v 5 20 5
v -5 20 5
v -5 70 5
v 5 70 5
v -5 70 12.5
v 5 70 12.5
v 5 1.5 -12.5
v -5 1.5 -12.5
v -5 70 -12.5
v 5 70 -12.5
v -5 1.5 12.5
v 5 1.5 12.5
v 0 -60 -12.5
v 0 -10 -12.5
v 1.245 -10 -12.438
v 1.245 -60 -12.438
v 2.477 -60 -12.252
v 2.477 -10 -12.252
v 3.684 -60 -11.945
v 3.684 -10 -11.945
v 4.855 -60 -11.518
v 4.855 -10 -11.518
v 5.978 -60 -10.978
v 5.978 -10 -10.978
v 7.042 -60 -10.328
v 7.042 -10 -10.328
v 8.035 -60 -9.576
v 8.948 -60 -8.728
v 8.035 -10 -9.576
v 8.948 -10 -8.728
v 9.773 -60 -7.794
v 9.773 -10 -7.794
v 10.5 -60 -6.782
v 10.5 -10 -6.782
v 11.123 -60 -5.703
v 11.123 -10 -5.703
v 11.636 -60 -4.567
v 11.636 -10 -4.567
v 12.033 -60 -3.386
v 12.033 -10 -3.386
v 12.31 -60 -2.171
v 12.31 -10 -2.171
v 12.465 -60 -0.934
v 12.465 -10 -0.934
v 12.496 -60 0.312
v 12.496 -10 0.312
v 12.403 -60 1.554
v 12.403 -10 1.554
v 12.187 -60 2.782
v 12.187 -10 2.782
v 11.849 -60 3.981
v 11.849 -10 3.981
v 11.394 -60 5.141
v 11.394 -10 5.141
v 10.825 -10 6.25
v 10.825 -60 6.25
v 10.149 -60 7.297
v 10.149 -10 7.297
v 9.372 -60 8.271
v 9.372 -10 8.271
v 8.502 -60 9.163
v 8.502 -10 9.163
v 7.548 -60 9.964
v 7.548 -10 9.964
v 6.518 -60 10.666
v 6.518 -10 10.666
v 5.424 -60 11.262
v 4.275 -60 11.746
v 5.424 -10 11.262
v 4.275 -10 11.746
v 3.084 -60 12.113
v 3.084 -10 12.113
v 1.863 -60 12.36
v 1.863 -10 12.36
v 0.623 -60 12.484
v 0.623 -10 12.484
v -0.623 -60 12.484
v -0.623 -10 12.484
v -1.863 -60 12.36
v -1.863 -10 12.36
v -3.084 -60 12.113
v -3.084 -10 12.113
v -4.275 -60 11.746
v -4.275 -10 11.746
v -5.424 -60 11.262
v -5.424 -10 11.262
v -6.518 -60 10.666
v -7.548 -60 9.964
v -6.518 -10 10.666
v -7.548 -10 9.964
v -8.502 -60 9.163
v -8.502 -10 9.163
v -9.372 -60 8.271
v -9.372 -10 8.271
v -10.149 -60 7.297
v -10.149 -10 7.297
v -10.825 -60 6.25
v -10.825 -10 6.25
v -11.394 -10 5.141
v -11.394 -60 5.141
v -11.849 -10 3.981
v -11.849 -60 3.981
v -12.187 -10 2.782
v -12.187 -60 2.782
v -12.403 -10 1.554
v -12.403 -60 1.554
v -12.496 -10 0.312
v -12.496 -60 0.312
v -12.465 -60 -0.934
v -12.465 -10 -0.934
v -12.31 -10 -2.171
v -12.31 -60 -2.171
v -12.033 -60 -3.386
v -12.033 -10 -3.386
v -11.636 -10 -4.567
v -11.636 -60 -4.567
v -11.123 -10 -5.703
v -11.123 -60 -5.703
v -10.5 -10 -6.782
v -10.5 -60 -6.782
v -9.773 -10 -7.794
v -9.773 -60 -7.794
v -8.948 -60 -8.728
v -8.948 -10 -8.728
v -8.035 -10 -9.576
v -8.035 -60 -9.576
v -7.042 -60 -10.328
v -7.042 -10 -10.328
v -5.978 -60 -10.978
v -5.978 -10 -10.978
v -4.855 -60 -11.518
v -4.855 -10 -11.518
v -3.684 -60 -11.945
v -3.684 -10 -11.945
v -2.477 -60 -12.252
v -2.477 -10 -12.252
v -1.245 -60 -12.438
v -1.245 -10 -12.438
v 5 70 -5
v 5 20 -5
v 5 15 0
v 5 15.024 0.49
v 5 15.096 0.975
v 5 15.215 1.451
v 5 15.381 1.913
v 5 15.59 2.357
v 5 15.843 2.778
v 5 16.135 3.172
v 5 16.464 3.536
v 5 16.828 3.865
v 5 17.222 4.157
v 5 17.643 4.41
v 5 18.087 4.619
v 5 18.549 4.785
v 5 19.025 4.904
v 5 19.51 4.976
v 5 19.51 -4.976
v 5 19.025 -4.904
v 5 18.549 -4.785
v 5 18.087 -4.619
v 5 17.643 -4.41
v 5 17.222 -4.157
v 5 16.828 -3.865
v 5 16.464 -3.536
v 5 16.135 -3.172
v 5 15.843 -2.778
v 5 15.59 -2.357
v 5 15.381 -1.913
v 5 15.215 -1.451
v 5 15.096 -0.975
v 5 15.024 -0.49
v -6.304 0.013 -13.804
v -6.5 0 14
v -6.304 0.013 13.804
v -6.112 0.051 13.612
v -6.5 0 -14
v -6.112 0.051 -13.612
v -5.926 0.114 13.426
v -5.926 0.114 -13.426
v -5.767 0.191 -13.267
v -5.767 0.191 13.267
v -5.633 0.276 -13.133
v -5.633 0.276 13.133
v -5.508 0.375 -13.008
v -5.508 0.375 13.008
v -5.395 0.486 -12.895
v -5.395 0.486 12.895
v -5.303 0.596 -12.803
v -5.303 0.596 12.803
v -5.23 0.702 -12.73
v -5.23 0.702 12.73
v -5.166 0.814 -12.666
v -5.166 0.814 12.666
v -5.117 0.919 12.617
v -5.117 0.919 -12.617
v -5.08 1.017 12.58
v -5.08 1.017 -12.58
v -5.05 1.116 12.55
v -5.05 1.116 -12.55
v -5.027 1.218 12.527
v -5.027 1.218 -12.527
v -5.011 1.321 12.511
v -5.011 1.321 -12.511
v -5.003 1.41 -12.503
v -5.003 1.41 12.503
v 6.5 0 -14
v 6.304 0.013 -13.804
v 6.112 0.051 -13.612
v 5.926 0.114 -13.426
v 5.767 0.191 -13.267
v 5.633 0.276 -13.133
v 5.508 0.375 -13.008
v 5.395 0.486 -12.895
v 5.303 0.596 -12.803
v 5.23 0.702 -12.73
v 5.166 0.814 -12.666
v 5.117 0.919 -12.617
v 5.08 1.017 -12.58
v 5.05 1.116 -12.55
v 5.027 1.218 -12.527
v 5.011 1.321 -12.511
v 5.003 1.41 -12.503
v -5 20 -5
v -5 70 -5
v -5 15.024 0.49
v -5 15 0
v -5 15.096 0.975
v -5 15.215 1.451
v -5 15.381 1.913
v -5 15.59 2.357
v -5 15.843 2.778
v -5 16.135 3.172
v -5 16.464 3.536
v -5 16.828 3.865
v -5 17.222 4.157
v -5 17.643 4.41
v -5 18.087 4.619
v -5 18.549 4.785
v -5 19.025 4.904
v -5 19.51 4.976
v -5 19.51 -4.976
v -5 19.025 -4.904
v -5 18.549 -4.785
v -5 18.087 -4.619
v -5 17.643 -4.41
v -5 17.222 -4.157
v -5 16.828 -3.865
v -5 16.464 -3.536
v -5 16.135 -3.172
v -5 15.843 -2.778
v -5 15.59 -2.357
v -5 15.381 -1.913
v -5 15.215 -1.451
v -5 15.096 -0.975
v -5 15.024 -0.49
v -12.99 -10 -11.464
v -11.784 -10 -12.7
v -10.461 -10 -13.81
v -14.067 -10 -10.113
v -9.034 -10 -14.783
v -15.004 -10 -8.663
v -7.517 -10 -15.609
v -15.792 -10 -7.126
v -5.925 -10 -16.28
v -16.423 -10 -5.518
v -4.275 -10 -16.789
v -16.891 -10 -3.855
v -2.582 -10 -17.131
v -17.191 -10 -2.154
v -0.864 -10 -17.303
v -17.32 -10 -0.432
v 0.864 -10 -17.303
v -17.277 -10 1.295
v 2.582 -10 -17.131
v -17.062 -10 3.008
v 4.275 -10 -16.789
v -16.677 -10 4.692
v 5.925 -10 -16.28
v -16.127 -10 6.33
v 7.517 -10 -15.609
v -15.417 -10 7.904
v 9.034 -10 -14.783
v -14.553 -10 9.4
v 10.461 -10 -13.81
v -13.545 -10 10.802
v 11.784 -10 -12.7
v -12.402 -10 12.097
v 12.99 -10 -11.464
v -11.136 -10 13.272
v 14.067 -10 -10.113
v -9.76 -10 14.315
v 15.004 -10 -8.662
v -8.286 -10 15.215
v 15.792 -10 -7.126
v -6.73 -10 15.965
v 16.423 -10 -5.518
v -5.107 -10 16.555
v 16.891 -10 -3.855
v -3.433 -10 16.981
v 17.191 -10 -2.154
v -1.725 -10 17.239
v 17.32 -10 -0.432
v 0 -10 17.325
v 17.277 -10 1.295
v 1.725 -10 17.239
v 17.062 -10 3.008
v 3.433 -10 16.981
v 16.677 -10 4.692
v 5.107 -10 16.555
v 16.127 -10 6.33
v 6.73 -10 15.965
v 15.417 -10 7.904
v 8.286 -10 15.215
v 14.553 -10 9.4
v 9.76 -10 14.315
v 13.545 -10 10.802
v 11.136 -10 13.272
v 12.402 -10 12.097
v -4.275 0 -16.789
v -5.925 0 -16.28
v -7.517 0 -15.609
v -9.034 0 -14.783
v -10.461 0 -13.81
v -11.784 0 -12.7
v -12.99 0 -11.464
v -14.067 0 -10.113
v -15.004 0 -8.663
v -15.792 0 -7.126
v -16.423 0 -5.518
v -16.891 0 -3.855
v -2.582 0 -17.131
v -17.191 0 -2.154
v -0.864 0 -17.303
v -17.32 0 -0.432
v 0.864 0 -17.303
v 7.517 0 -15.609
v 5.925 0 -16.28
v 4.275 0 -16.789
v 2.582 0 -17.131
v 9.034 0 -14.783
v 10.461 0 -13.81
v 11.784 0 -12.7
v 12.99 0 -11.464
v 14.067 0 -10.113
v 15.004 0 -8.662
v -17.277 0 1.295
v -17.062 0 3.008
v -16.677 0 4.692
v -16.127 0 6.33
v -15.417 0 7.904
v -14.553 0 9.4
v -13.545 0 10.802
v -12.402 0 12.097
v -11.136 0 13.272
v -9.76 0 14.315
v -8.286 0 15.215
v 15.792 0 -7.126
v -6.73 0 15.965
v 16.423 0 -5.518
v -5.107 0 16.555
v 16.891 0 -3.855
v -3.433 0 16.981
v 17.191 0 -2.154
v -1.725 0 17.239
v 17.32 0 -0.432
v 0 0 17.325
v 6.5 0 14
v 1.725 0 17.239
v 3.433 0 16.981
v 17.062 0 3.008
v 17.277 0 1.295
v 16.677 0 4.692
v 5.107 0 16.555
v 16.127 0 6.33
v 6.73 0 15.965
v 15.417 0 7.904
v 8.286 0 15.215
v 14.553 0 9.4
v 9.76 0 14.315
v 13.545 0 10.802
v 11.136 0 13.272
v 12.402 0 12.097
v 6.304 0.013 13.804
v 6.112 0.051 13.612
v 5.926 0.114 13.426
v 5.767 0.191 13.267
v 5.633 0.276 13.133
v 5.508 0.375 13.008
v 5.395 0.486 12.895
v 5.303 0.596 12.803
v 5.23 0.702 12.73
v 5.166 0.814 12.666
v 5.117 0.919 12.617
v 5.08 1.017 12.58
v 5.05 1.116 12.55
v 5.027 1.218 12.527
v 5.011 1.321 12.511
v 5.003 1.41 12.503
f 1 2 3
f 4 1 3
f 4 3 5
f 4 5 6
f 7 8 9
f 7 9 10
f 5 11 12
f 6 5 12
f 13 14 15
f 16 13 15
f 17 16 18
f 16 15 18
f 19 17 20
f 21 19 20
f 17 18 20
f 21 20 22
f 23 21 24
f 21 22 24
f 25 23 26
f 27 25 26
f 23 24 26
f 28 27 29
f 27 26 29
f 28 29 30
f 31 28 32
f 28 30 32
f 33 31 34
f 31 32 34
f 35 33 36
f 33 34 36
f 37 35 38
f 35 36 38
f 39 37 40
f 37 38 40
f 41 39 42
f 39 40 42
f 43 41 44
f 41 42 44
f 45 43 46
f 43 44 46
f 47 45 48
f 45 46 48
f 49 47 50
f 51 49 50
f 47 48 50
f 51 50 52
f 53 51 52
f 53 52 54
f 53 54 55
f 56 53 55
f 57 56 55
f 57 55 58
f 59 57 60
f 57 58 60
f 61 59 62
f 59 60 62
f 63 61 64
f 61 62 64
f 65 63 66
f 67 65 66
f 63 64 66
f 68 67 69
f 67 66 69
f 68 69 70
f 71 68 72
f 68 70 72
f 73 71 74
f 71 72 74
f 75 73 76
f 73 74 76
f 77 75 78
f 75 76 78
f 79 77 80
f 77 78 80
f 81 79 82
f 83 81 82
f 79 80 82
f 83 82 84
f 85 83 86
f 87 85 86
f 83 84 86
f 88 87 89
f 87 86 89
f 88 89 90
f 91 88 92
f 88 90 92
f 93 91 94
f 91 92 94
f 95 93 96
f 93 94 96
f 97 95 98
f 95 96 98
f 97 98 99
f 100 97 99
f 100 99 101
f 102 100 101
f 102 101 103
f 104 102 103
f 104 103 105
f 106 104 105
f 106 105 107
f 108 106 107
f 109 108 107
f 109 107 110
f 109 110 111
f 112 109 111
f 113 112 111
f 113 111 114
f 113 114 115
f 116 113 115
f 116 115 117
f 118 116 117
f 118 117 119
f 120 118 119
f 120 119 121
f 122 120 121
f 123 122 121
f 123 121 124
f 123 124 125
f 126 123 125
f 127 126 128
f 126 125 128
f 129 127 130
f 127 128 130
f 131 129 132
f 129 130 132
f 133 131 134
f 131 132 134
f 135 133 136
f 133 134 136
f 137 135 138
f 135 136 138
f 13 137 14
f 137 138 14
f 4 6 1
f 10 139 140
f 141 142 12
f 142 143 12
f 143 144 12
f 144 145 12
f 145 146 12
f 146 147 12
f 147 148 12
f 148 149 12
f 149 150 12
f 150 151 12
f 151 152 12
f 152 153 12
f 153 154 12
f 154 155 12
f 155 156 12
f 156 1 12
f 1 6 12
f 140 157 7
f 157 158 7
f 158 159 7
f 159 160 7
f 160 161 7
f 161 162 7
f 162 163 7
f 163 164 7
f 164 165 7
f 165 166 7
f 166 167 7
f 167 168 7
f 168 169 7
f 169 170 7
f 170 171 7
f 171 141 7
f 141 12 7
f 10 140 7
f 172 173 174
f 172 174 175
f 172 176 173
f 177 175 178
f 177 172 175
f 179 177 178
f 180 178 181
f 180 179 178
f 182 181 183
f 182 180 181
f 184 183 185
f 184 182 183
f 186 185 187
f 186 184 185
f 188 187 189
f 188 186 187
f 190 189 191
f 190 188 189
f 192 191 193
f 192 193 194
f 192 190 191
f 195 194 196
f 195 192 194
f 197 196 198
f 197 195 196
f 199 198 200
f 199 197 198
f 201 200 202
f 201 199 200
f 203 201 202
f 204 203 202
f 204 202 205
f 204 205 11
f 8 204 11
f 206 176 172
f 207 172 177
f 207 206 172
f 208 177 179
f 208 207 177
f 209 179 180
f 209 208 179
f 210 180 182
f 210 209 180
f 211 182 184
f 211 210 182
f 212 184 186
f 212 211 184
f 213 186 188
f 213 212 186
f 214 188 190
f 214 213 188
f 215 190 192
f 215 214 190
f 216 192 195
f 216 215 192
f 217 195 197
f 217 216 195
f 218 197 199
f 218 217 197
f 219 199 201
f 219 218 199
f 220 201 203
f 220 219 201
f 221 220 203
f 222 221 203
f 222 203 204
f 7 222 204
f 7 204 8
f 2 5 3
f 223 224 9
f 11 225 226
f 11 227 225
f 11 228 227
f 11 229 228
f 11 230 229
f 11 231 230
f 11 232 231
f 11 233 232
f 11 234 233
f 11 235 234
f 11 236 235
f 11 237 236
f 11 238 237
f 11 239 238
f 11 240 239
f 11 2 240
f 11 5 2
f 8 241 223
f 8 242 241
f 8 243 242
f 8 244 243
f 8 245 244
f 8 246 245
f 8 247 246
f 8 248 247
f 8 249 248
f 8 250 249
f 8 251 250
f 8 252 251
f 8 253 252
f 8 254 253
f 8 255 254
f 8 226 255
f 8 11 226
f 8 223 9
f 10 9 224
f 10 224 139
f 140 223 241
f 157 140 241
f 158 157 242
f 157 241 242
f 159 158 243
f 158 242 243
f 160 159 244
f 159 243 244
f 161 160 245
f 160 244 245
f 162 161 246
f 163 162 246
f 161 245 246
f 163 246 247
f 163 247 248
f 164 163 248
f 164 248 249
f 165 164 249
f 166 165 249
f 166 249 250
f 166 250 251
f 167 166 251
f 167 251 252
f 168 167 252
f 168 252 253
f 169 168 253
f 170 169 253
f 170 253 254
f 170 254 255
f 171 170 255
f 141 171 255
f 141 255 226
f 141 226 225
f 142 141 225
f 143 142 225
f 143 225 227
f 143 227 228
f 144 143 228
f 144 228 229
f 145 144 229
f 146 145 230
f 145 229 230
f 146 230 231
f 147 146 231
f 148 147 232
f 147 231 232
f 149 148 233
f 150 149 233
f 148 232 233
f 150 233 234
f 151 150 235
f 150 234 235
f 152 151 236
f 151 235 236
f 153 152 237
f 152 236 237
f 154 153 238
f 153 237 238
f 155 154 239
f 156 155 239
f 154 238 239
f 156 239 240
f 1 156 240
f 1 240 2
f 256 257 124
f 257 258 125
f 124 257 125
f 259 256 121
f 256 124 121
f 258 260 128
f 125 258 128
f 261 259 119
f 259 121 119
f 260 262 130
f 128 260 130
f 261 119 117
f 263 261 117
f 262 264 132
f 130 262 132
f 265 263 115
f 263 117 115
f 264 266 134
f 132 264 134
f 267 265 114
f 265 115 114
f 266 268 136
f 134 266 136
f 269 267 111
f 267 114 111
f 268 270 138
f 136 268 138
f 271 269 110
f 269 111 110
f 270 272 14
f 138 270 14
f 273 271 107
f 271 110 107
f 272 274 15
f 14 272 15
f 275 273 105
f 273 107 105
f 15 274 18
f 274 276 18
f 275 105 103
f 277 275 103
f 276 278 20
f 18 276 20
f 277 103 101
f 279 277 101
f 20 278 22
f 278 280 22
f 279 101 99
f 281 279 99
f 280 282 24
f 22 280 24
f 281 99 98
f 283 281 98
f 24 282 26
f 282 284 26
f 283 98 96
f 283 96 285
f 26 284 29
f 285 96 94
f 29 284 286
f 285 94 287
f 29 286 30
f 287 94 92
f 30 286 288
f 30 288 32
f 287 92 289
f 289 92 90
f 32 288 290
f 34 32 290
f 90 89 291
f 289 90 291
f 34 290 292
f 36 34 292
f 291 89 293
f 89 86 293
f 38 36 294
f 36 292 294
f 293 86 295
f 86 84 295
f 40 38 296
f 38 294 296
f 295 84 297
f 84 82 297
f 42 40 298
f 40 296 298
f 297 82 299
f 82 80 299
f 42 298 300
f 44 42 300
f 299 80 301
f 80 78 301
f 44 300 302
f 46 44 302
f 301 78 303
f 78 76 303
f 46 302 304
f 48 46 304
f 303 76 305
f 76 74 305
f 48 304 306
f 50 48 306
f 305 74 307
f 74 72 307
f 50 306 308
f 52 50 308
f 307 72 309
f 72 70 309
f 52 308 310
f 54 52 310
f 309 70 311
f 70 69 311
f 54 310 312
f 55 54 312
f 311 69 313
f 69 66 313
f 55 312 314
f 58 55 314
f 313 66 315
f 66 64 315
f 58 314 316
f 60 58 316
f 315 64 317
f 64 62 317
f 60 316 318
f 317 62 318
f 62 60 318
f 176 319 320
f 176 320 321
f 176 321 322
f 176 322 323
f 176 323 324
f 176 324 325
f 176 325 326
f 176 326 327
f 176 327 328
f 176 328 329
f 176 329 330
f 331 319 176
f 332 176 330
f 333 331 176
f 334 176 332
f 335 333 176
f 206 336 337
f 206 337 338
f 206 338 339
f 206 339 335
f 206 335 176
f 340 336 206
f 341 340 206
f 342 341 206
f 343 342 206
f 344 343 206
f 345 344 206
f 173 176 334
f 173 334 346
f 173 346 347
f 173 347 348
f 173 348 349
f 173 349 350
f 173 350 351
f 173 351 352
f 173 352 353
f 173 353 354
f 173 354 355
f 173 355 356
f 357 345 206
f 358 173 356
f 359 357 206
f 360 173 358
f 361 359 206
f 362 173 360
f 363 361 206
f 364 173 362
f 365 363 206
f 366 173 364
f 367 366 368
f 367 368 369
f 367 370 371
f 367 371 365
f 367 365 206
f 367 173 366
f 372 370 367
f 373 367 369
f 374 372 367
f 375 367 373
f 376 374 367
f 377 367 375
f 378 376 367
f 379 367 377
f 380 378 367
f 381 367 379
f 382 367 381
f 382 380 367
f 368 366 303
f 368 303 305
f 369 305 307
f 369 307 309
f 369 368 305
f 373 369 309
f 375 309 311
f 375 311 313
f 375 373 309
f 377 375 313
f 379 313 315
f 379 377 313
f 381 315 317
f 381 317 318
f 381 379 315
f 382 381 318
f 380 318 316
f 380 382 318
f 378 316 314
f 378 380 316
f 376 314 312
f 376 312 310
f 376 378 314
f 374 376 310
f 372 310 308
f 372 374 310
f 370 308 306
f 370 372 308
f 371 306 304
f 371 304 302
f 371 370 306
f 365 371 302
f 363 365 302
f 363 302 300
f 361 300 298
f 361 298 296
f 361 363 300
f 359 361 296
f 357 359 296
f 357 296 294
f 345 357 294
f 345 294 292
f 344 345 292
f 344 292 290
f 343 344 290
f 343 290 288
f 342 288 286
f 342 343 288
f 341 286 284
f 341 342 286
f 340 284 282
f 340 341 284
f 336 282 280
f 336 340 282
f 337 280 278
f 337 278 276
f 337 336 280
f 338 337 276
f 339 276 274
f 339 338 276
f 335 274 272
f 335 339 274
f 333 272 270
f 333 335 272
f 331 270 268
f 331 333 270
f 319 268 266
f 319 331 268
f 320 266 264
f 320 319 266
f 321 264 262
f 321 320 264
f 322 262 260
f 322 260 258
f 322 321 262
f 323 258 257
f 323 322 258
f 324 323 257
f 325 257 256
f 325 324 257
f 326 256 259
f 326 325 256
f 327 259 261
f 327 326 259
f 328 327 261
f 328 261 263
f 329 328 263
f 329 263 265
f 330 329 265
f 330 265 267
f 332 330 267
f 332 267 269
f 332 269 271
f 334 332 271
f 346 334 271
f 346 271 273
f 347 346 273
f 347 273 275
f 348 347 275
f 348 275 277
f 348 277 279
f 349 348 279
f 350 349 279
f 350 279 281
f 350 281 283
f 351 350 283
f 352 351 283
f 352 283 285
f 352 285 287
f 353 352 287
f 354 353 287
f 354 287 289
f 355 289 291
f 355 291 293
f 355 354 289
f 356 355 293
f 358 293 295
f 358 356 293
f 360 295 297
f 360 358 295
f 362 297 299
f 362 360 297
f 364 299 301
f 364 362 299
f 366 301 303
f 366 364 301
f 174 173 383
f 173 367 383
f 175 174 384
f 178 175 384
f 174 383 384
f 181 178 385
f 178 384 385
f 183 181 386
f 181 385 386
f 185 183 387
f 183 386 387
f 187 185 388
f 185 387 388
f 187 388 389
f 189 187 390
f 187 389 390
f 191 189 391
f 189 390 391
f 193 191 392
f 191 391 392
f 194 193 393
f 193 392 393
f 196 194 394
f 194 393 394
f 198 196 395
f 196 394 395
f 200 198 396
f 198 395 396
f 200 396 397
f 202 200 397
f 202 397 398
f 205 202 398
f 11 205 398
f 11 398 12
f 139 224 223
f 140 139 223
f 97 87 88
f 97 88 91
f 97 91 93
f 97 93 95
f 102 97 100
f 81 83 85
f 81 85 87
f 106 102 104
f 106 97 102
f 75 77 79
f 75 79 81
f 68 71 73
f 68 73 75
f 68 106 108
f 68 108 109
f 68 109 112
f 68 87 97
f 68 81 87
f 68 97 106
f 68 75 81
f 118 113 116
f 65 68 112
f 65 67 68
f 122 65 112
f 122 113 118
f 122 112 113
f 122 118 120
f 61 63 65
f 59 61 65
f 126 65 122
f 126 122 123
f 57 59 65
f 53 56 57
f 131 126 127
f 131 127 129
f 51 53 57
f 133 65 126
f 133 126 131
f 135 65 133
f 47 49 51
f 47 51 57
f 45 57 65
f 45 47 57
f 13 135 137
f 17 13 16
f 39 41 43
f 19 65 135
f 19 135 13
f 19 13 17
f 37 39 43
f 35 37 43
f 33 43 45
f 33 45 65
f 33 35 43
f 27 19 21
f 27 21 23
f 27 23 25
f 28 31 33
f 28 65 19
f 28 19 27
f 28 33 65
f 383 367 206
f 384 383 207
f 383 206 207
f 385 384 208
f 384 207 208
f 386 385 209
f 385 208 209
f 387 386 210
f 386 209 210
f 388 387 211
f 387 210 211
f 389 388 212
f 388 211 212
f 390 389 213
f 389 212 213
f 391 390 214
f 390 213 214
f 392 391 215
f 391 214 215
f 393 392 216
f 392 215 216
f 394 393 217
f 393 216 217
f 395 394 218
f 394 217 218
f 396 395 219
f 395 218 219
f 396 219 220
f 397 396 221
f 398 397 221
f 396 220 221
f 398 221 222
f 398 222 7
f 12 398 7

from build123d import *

# Parameters (mm, degrees)
SKETCH1_R           = 17.325
BOSS_EXTRUDE1_DEPTH = 10
SKETCH2_R           = 12.5
BOSS_EXTRUDE2_DEPTH = 50
SKETCH3_W           = 10
SKETCH3_H           = 25
BOSS_EXTRUDE3_DEPTH = 70
FILLET1_R           = 1.5
CUT_EXTRUDE1_DEPTH  = 76.488815397


with BuildPart() as part:
    # Sketch1 → Boss-Extrude1 (new body)
    with BuildSketch(Plane(origin=(0, 0, 0), x_dir=(1, 0, 0), z_dir=(0, 1, 0))):
        with Locations(Location((0, 0, 0), (0, 0, 270))):
            Circle(SKETCH1_R)
    extrude(amount=-BOSS_EXTRUDE1_DEPTH)

    # Sketch2 → Boss-Extrude2 (add)
    with BuildSketch(Plane.XZ.offset(10)):
        with Locations(Location((0, 0, 0), (0, 0, 270))):
            Circle(SKETCH2_R)
    extrude(amount=BOSS_EXTRUDE2_DEPTH)

    # Sketch3 → Boss-Extrude3 (add)
    with BuildSketch(Plane(origin=(0, 0, 0), x_dir=(1, 0, 0), z_dir=(0, 1, 0))):
        Rectangle(SKETCH3_W, SKETCH3_H)
    extrude(amount=BOSS_EXTRUDE3_DEPTH)

    # Fillet1
    fillet1_edges = [part.edges().sort_by_distance(p)[0] for p in [
        (5, 0, 0),
        (0, 0, -12.5),
        (-5, 0, 0),
        (0, 0, 12.5),
    ]]
    fillet(fillet1_edges, radius=FILLET1_R)

    # Sketch4 → Cut-Extrude1 (cut, through all)
    with BuildSketch(Plane.ZY.offset(5)):
        with BuildLine():
            Line((5, 70), (-5, 70))
            Line((-5, 70), (-5, 20))
            ThreePointArc((-5, 20), (0, 15), (5, 20))
            Line((5, 20), (5, 70))
        make_face()
    extrude(amount=-CUT_EXTRUDE1_DEPTH, mode=Mode.SUBTRACT)


solid = part.part
